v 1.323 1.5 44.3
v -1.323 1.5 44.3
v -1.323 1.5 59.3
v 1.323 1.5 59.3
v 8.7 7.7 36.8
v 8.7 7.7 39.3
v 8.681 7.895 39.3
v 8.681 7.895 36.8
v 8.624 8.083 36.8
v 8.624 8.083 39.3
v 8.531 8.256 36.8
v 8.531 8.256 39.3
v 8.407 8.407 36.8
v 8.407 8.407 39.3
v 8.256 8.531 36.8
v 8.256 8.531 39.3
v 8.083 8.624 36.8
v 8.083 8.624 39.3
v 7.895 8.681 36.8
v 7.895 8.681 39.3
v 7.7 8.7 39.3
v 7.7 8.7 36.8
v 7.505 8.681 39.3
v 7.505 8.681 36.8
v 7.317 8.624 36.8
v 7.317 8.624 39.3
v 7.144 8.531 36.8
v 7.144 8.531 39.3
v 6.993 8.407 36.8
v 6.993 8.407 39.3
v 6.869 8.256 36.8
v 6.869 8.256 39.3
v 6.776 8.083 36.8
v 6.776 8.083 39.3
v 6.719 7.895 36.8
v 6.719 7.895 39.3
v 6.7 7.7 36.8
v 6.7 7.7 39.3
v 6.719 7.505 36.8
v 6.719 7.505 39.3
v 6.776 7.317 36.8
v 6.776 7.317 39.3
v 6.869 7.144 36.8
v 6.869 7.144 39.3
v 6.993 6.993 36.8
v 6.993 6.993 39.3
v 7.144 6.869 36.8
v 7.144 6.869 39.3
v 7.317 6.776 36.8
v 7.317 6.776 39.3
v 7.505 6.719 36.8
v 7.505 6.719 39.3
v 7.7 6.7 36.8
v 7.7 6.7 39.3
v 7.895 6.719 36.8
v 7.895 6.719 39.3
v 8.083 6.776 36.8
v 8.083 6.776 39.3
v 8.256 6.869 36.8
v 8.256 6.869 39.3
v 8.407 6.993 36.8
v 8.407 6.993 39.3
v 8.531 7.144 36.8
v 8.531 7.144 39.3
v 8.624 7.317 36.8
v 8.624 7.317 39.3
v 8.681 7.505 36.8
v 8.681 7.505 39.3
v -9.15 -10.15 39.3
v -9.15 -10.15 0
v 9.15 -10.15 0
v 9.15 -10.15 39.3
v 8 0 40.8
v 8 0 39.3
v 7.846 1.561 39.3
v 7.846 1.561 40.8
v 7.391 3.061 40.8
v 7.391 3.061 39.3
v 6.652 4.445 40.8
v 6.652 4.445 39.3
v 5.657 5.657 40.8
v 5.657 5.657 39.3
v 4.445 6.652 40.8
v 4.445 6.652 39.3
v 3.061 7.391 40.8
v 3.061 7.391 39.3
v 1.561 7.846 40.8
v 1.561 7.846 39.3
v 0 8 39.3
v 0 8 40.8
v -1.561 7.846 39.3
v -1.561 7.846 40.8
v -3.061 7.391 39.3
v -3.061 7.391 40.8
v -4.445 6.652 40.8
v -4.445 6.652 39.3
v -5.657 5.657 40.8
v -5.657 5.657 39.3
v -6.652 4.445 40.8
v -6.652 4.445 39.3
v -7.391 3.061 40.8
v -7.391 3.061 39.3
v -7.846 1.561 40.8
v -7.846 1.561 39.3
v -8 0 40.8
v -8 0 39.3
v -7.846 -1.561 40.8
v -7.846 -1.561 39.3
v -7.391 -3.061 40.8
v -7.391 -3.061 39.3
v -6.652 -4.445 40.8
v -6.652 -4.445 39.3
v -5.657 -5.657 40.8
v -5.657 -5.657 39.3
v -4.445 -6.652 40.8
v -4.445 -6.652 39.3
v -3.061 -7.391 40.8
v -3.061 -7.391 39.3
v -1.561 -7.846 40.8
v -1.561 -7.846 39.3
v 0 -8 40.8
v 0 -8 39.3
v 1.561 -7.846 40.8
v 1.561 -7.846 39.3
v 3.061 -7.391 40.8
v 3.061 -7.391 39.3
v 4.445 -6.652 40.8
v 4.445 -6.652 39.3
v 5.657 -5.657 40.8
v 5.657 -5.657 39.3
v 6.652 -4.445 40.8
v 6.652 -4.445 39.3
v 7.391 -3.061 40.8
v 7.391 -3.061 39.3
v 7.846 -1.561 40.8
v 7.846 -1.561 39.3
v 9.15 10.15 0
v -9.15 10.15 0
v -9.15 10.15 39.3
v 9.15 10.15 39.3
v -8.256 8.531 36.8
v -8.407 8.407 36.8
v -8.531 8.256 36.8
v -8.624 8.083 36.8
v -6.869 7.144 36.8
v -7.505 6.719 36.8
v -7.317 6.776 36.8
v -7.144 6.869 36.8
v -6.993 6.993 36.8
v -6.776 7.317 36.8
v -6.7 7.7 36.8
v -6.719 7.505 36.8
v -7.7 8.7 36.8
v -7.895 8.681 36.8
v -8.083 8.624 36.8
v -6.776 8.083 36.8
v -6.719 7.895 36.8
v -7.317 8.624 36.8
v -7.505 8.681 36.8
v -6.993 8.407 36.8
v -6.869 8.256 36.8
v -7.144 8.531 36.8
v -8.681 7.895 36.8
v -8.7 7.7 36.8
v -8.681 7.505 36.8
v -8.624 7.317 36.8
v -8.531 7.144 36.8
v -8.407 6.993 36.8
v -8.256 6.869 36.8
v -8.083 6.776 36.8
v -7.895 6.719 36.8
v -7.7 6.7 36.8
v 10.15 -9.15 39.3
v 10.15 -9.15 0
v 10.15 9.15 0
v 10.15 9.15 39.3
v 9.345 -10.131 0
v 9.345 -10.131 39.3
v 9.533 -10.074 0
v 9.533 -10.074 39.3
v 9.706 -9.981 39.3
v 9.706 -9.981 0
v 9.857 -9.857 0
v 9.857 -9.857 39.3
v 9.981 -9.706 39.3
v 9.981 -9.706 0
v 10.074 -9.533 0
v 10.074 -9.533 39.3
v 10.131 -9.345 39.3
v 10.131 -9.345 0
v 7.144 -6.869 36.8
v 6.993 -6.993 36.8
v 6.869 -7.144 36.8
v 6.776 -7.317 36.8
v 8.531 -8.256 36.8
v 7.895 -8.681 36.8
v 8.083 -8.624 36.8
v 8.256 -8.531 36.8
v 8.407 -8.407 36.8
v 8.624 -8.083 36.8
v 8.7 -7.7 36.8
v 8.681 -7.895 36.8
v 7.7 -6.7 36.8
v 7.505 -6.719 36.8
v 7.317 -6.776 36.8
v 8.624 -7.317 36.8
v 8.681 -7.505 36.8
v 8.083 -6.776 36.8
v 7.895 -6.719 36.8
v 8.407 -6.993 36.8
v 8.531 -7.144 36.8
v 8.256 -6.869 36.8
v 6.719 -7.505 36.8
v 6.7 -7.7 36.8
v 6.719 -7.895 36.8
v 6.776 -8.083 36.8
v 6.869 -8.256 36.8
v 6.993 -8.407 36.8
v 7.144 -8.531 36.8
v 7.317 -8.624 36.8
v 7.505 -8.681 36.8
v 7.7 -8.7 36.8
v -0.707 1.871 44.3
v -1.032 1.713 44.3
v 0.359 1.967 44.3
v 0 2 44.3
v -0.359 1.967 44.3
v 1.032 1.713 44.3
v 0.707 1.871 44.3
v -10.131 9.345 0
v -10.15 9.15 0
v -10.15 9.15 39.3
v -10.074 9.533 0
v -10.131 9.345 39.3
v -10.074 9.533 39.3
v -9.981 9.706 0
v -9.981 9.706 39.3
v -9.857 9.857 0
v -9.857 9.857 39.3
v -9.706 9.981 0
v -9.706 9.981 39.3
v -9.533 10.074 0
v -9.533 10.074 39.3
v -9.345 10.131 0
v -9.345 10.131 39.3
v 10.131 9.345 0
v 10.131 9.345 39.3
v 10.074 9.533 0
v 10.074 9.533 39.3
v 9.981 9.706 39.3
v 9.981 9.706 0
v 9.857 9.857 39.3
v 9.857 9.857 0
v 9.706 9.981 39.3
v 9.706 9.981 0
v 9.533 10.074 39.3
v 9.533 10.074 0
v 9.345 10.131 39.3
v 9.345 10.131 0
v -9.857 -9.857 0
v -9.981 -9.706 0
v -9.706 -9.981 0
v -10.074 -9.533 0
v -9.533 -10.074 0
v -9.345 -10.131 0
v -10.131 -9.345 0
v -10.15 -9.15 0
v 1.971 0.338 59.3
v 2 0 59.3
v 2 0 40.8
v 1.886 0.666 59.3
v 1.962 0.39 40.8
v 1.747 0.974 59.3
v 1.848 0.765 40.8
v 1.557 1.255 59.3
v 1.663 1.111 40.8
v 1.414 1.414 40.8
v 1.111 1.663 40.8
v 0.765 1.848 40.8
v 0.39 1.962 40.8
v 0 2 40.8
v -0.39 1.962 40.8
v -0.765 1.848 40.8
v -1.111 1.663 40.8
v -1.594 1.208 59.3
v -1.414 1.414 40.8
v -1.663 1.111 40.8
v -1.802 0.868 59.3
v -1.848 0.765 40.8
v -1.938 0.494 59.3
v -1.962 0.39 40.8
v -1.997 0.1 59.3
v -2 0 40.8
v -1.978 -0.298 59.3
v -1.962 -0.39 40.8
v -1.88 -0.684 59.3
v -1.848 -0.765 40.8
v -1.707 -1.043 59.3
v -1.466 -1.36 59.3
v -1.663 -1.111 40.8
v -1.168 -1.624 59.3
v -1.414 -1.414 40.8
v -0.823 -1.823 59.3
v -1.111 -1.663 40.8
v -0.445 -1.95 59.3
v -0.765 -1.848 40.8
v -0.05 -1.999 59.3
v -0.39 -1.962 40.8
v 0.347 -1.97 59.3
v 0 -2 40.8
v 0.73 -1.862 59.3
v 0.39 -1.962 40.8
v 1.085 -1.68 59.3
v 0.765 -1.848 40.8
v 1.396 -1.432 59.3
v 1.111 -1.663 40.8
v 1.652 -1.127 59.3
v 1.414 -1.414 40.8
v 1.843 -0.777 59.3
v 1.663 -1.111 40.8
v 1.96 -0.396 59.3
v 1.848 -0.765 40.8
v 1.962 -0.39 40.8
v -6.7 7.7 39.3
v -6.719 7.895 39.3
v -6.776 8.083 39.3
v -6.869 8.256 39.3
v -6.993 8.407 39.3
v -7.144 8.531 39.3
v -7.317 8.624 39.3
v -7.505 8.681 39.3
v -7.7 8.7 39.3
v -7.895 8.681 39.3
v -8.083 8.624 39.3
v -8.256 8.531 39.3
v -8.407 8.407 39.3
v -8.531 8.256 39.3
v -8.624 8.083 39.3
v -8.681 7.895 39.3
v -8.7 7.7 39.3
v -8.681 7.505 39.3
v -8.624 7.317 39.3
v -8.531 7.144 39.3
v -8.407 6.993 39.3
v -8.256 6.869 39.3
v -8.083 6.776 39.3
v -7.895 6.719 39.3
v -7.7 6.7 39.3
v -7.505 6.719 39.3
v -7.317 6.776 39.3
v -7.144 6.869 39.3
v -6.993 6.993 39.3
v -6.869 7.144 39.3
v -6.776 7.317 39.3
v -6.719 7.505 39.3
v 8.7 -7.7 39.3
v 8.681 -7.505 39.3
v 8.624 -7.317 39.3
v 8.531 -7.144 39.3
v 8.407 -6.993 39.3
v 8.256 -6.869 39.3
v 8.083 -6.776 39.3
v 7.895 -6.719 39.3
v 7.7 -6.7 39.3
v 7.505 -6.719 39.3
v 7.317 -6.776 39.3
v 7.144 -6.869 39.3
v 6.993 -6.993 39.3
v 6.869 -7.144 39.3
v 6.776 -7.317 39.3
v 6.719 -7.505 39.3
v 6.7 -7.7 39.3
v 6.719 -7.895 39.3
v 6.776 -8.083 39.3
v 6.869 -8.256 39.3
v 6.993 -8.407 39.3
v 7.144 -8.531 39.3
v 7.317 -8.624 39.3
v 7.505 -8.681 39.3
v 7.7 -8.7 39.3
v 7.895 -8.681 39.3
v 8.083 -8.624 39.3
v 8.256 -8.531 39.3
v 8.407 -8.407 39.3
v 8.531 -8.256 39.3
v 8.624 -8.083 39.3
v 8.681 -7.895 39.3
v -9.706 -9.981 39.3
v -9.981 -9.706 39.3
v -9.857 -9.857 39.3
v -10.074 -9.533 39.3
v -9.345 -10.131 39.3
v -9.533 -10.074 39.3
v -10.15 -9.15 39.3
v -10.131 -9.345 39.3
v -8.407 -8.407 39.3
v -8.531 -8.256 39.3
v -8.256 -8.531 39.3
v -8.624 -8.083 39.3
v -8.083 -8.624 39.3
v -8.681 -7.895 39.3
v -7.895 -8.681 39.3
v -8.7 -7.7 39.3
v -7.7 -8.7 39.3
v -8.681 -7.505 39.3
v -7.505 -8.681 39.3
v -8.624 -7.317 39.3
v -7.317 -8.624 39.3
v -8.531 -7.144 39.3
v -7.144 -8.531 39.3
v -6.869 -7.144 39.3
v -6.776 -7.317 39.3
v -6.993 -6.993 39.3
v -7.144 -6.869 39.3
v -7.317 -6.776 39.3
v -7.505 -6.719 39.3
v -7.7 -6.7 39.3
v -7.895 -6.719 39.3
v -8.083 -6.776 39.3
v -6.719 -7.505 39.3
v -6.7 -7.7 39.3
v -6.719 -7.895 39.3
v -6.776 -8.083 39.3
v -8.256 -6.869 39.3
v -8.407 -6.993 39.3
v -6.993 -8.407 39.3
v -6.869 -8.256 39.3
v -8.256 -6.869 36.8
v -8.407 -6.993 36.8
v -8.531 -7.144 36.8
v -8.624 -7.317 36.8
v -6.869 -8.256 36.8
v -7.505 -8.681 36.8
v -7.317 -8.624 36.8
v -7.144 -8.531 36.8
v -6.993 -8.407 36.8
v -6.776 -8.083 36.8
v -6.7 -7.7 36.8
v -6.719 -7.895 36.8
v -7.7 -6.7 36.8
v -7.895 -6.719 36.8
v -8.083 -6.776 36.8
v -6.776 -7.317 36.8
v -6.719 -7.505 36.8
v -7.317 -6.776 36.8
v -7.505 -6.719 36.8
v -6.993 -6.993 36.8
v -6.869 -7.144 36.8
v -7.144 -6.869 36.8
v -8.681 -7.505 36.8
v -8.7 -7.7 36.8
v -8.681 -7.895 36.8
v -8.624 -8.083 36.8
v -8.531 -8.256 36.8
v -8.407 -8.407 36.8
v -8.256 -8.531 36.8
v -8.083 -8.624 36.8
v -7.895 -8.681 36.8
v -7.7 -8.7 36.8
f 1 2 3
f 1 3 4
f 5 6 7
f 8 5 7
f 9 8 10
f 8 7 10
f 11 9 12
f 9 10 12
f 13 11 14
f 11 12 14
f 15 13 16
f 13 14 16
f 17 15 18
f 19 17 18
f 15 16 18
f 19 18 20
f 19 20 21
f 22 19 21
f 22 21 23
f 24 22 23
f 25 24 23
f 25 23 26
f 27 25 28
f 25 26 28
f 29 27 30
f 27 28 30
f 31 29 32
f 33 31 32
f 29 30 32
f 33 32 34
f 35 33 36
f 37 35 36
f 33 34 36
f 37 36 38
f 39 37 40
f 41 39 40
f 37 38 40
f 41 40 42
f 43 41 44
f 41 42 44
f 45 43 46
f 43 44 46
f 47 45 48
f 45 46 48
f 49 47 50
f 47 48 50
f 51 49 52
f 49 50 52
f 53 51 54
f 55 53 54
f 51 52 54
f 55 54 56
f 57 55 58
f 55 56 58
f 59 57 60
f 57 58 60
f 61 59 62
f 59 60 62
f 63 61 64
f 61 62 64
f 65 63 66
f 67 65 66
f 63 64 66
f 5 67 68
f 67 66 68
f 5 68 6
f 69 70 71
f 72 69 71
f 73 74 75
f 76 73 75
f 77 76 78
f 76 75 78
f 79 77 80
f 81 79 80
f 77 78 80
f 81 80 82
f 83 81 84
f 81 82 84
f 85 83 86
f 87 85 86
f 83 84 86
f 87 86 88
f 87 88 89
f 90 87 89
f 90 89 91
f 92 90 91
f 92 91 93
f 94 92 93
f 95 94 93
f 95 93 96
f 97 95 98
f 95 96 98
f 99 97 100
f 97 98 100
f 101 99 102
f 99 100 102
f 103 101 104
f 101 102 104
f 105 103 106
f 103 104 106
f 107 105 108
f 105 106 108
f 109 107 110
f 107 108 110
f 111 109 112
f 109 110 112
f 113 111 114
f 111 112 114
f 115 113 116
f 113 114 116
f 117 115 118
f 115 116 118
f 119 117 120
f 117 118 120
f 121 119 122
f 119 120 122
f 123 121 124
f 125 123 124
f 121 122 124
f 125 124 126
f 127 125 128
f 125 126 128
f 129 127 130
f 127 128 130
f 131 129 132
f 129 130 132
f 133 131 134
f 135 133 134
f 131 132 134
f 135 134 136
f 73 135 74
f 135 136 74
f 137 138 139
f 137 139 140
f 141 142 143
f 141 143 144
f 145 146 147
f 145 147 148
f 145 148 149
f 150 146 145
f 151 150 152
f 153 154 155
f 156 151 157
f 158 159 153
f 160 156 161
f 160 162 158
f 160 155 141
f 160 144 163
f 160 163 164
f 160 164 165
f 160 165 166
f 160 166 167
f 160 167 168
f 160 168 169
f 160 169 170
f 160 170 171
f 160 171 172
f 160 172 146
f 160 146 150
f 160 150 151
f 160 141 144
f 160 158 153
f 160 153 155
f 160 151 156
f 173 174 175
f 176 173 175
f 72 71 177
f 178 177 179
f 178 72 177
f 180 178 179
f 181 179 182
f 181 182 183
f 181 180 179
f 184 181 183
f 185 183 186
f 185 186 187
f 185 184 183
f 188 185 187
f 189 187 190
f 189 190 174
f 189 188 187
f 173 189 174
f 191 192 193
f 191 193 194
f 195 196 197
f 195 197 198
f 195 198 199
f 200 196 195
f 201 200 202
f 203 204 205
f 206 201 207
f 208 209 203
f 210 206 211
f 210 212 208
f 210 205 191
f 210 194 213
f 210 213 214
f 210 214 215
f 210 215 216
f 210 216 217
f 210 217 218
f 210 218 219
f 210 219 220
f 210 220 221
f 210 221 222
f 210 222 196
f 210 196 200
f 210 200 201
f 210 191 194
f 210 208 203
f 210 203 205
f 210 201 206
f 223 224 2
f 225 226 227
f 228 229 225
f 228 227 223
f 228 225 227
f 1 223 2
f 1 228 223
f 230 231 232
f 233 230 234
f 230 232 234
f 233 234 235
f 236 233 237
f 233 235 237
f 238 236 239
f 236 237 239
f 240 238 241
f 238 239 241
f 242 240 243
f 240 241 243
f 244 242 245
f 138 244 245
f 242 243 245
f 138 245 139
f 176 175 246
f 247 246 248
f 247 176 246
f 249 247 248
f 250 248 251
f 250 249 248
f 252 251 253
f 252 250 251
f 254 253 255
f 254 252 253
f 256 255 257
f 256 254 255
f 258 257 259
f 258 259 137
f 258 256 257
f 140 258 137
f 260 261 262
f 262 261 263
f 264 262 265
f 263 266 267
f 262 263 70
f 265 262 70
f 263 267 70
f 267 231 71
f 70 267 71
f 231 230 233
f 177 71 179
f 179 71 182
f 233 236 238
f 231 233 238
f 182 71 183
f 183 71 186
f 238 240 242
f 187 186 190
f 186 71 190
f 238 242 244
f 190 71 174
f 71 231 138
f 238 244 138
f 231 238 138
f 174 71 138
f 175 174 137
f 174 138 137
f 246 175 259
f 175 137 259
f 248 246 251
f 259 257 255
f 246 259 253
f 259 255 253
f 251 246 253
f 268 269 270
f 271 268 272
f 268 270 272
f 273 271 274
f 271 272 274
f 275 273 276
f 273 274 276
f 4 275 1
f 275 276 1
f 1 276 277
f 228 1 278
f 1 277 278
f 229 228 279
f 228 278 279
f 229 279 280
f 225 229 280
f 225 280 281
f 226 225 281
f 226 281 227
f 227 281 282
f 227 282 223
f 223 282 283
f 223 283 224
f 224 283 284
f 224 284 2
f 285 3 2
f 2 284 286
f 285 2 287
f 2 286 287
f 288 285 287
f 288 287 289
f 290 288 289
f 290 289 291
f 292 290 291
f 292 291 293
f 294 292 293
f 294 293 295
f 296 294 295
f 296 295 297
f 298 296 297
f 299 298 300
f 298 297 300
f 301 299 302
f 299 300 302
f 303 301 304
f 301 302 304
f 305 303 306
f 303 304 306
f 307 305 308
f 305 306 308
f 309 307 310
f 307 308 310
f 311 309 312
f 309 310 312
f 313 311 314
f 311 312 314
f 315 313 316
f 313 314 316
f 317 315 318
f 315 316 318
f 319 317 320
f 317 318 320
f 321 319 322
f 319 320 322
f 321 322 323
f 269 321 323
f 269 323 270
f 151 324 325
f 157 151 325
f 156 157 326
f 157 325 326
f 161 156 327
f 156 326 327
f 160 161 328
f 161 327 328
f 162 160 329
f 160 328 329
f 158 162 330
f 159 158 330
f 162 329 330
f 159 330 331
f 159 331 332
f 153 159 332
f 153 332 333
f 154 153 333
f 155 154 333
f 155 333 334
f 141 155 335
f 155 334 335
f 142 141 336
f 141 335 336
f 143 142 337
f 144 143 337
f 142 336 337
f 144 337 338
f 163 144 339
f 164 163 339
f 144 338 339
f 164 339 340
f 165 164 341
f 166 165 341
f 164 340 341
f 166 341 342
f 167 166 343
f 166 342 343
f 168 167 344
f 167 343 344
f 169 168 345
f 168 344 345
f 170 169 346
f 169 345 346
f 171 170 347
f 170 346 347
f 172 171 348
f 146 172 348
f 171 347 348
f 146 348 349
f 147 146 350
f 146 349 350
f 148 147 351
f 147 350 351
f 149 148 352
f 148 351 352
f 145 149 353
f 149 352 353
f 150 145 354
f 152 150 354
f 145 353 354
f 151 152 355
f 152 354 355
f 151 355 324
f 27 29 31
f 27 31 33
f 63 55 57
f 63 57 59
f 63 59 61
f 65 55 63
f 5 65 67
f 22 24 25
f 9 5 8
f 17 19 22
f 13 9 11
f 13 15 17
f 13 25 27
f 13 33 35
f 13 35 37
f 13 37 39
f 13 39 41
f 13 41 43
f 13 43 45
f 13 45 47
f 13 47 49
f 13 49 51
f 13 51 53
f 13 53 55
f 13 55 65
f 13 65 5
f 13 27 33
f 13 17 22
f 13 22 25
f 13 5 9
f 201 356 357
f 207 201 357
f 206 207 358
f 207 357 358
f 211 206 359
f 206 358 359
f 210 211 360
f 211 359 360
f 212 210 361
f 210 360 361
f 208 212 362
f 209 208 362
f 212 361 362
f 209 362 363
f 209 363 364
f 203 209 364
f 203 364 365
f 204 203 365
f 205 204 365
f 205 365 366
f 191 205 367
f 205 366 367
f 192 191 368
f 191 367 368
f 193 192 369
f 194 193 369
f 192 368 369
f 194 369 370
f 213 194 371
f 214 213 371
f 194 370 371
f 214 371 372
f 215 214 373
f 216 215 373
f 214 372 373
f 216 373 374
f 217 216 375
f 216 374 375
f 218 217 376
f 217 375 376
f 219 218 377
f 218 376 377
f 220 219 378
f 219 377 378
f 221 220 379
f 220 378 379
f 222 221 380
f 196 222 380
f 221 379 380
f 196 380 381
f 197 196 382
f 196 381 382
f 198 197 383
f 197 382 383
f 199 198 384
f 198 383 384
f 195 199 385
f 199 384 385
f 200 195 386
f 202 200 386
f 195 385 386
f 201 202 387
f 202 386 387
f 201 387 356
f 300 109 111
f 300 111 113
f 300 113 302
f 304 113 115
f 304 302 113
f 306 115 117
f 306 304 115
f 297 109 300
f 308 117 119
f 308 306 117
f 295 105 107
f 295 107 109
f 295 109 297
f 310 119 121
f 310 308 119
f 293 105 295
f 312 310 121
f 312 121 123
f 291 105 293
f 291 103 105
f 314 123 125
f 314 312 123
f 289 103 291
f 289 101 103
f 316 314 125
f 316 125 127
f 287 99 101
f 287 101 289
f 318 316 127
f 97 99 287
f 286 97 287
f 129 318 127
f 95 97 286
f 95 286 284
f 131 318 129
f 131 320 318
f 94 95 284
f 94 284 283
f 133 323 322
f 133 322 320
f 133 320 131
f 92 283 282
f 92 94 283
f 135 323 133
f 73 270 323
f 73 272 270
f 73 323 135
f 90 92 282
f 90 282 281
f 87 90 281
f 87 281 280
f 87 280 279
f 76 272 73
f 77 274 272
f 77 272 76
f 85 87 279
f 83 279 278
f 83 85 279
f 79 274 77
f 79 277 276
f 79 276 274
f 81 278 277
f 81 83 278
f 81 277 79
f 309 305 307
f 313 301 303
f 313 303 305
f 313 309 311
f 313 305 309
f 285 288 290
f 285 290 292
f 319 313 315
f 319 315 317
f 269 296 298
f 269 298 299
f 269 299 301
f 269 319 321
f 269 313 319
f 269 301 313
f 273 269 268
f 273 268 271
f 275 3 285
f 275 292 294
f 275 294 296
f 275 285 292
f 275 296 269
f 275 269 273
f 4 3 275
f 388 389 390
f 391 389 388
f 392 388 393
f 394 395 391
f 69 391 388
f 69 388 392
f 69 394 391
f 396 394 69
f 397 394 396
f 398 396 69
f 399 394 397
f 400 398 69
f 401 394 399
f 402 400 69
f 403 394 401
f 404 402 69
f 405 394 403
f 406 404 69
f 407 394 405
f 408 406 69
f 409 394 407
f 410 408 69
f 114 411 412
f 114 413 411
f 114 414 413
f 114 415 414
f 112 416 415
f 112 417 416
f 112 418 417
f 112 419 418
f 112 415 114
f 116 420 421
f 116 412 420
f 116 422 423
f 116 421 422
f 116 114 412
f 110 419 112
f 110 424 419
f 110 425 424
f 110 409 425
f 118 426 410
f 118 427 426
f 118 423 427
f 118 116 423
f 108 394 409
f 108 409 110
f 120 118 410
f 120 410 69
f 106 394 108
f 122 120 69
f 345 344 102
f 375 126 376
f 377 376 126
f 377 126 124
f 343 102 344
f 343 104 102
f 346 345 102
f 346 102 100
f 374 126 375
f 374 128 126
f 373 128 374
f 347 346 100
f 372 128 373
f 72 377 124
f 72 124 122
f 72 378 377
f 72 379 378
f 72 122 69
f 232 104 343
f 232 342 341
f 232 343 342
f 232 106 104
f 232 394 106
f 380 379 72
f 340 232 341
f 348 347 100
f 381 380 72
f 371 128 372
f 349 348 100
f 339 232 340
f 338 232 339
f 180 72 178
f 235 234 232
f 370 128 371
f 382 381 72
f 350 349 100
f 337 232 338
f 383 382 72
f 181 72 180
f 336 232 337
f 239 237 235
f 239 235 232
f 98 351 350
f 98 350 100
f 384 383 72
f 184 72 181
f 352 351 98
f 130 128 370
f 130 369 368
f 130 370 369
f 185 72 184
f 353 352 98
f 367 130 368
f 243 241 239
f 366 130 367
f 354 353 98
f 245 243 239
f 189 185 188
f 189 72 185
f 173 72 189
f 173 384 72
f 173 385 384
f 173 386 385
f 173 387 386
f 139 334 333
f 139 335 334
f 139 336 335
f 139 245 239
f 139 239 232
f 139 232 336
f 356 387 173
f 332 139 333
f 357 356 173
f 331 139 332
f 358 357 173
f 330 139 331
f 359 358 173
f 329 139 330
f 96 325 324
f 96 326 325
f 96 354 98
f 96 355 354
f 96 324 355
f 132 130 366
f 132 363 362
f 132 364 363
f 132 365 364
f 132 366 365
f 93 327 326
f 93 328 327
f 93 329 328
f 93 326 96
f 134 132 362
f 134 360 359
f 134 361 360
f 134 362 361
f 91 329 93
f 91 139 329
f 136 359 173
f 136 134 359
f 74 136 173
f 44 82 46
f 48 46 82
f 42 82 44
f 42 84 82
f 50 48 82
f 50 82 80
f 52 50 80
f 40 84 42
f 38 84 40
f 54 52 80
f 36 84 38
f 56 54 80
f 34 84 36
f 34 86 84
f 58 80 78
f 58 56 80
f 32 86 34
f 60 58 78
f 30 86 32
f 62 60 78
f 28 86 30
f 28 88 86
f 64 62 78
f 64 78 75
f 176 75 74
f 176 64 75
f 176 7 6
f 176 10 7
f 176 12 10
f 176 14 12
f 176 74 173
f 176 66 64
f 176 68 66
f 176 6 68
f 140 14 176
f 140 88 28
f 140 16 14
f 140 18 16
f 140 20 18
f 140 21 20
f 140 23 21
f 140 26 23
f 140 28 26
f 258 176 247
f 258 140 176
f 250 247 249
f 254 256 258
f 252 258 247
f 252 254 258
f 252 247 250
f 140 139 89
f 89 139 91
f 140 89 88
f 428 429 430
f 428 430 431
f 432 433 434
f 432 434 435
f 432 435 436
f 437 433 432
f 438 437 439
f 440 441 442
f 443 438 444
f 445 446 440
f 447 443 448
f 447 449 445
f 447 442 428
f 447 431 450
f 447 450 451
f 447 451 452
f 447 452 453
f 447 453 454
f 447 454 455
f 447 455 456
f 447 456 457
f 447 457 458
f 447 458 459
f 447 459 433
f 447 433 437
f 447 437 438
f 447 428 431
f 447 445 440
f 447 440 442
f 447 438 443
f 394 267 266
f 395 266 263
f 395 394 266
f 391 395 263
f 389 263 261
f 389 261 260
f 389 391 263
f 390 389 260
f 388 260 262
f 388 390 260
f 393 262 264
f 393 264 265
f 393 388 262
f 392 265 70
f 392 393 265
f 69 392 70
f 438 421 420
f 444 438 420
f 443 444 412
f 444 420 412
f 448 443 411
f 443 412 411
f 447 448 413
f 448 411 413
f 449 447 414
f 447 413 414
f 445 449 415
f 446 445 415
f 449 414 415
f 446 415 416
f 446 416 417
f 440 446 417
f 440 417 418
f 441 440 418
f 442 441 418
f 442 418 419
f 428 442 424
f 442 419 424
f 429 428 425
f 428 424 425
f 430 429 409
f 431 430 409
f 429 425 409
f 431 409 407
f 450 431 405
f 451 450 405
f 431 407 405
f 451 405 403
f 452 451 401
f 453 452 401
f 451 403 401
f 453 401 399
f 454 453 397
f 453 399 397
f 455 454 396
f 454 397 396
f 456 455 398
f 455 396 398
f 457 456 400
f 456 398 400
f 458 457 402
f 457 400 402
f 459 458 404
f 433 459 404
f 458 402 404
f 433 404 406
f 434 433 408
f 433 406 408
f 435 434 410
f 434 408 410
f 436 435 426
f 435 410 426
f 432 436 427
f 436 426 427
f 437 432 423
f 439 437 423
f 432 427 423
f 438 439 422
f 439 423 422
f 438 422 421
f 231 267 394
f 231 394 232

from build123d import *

# Parameters (mm, degrees)
SKETCH1_W           = 20.3
SKETCH1_H           = 20.3
BOSS_EXTRUDE1_DEPTH = 39.3
FILLET1_R           = 1
SKETCH2_R           = 1
CUT_EXTRUDE1_DEPTH  = 2.5
SKETCH3_R           = 8
BOSS_EXTRUDE2_DEPTH = 1.5
SKETCH5_R           = 2
BOSS_EXTRUDE3_DEPTH = 20
CUT_EXTRUDE2_START  = -15
CUT_EXTRUDE2_DEPTH  = 15


with BuildPart() as part:
    # Sketch1 → Boss-Extrude1 (new body)
    with BuildSketch(Plane.XY):
        Rectangle(SKETCH1_W, SKETCH1_H)
    extrude(amount=BOSS_EXTRUDE1_DEPTH)

    # Fillet1
    fillet1_edges = [part.edges().sort_by_distance(p)[0] for p in [
        (-10.15, 10.15, 19.65),
        (10.15, 10.15, 19.65),
        (10.15, -10.15, 19.65),
        (-10.15, -10.15, 19.65),
    ]]
    fillet(fillet1_edges, radius=FILLET1_R)

    # Sketch2 → Cut-Extrude1 (cut)
    with BuildSketch(Plane.XY.offset(39.3)):
        with Locations((-7.7, 7.7)):
            Circle(SKETCH2_R)
        with Locations((-7.7, -7.7)):
            Circle(SKETCH2_R)
        with Locations((7.7, -7.7)):
            Circle(SKETCH2_R)
        with Locations((7.7, 7.7)):
            Circle(SKETCH2_R)
    extrude(amount=-CUT_EXTRUDE1_DEPTH, mode=Mode.SUBTRACT)

    # Sketch3 → Boss-Extrude2 (add)
    with BuildSketch(Plane.XY.offset(39.3)):
        Circle(SKETCH3_R)
    extrude(amount=BOSS_EXTRUDE2_DEPTH)

    # Sketch5 → Boss-Extrude3 (add)
    with BuildSketch(Plane.XY.offset(39.3)):
        Circle(SKETCH5_R)
    extrude(amount=BOSS_EXTRUDE3_DEPTH)

    # Sketch6 → Cut-Extrude2 (cut)
    with BuildSketch(Plane.XY.offset(59.3).offset(CUT_EXTRUDE2_START)):
        with BuildLine():
            Line((-1.322875656, 1.5), (1.322875656, 1.5))
            ThreePointArc((1.322875656, 1.5), (0, 2), (-1.322875656, 1.5))
        make_face()
    extrude(amount=CUT_EXTRUDE2_DEPTH, mode=Mode.SUBTRACT)


solid = part.part
